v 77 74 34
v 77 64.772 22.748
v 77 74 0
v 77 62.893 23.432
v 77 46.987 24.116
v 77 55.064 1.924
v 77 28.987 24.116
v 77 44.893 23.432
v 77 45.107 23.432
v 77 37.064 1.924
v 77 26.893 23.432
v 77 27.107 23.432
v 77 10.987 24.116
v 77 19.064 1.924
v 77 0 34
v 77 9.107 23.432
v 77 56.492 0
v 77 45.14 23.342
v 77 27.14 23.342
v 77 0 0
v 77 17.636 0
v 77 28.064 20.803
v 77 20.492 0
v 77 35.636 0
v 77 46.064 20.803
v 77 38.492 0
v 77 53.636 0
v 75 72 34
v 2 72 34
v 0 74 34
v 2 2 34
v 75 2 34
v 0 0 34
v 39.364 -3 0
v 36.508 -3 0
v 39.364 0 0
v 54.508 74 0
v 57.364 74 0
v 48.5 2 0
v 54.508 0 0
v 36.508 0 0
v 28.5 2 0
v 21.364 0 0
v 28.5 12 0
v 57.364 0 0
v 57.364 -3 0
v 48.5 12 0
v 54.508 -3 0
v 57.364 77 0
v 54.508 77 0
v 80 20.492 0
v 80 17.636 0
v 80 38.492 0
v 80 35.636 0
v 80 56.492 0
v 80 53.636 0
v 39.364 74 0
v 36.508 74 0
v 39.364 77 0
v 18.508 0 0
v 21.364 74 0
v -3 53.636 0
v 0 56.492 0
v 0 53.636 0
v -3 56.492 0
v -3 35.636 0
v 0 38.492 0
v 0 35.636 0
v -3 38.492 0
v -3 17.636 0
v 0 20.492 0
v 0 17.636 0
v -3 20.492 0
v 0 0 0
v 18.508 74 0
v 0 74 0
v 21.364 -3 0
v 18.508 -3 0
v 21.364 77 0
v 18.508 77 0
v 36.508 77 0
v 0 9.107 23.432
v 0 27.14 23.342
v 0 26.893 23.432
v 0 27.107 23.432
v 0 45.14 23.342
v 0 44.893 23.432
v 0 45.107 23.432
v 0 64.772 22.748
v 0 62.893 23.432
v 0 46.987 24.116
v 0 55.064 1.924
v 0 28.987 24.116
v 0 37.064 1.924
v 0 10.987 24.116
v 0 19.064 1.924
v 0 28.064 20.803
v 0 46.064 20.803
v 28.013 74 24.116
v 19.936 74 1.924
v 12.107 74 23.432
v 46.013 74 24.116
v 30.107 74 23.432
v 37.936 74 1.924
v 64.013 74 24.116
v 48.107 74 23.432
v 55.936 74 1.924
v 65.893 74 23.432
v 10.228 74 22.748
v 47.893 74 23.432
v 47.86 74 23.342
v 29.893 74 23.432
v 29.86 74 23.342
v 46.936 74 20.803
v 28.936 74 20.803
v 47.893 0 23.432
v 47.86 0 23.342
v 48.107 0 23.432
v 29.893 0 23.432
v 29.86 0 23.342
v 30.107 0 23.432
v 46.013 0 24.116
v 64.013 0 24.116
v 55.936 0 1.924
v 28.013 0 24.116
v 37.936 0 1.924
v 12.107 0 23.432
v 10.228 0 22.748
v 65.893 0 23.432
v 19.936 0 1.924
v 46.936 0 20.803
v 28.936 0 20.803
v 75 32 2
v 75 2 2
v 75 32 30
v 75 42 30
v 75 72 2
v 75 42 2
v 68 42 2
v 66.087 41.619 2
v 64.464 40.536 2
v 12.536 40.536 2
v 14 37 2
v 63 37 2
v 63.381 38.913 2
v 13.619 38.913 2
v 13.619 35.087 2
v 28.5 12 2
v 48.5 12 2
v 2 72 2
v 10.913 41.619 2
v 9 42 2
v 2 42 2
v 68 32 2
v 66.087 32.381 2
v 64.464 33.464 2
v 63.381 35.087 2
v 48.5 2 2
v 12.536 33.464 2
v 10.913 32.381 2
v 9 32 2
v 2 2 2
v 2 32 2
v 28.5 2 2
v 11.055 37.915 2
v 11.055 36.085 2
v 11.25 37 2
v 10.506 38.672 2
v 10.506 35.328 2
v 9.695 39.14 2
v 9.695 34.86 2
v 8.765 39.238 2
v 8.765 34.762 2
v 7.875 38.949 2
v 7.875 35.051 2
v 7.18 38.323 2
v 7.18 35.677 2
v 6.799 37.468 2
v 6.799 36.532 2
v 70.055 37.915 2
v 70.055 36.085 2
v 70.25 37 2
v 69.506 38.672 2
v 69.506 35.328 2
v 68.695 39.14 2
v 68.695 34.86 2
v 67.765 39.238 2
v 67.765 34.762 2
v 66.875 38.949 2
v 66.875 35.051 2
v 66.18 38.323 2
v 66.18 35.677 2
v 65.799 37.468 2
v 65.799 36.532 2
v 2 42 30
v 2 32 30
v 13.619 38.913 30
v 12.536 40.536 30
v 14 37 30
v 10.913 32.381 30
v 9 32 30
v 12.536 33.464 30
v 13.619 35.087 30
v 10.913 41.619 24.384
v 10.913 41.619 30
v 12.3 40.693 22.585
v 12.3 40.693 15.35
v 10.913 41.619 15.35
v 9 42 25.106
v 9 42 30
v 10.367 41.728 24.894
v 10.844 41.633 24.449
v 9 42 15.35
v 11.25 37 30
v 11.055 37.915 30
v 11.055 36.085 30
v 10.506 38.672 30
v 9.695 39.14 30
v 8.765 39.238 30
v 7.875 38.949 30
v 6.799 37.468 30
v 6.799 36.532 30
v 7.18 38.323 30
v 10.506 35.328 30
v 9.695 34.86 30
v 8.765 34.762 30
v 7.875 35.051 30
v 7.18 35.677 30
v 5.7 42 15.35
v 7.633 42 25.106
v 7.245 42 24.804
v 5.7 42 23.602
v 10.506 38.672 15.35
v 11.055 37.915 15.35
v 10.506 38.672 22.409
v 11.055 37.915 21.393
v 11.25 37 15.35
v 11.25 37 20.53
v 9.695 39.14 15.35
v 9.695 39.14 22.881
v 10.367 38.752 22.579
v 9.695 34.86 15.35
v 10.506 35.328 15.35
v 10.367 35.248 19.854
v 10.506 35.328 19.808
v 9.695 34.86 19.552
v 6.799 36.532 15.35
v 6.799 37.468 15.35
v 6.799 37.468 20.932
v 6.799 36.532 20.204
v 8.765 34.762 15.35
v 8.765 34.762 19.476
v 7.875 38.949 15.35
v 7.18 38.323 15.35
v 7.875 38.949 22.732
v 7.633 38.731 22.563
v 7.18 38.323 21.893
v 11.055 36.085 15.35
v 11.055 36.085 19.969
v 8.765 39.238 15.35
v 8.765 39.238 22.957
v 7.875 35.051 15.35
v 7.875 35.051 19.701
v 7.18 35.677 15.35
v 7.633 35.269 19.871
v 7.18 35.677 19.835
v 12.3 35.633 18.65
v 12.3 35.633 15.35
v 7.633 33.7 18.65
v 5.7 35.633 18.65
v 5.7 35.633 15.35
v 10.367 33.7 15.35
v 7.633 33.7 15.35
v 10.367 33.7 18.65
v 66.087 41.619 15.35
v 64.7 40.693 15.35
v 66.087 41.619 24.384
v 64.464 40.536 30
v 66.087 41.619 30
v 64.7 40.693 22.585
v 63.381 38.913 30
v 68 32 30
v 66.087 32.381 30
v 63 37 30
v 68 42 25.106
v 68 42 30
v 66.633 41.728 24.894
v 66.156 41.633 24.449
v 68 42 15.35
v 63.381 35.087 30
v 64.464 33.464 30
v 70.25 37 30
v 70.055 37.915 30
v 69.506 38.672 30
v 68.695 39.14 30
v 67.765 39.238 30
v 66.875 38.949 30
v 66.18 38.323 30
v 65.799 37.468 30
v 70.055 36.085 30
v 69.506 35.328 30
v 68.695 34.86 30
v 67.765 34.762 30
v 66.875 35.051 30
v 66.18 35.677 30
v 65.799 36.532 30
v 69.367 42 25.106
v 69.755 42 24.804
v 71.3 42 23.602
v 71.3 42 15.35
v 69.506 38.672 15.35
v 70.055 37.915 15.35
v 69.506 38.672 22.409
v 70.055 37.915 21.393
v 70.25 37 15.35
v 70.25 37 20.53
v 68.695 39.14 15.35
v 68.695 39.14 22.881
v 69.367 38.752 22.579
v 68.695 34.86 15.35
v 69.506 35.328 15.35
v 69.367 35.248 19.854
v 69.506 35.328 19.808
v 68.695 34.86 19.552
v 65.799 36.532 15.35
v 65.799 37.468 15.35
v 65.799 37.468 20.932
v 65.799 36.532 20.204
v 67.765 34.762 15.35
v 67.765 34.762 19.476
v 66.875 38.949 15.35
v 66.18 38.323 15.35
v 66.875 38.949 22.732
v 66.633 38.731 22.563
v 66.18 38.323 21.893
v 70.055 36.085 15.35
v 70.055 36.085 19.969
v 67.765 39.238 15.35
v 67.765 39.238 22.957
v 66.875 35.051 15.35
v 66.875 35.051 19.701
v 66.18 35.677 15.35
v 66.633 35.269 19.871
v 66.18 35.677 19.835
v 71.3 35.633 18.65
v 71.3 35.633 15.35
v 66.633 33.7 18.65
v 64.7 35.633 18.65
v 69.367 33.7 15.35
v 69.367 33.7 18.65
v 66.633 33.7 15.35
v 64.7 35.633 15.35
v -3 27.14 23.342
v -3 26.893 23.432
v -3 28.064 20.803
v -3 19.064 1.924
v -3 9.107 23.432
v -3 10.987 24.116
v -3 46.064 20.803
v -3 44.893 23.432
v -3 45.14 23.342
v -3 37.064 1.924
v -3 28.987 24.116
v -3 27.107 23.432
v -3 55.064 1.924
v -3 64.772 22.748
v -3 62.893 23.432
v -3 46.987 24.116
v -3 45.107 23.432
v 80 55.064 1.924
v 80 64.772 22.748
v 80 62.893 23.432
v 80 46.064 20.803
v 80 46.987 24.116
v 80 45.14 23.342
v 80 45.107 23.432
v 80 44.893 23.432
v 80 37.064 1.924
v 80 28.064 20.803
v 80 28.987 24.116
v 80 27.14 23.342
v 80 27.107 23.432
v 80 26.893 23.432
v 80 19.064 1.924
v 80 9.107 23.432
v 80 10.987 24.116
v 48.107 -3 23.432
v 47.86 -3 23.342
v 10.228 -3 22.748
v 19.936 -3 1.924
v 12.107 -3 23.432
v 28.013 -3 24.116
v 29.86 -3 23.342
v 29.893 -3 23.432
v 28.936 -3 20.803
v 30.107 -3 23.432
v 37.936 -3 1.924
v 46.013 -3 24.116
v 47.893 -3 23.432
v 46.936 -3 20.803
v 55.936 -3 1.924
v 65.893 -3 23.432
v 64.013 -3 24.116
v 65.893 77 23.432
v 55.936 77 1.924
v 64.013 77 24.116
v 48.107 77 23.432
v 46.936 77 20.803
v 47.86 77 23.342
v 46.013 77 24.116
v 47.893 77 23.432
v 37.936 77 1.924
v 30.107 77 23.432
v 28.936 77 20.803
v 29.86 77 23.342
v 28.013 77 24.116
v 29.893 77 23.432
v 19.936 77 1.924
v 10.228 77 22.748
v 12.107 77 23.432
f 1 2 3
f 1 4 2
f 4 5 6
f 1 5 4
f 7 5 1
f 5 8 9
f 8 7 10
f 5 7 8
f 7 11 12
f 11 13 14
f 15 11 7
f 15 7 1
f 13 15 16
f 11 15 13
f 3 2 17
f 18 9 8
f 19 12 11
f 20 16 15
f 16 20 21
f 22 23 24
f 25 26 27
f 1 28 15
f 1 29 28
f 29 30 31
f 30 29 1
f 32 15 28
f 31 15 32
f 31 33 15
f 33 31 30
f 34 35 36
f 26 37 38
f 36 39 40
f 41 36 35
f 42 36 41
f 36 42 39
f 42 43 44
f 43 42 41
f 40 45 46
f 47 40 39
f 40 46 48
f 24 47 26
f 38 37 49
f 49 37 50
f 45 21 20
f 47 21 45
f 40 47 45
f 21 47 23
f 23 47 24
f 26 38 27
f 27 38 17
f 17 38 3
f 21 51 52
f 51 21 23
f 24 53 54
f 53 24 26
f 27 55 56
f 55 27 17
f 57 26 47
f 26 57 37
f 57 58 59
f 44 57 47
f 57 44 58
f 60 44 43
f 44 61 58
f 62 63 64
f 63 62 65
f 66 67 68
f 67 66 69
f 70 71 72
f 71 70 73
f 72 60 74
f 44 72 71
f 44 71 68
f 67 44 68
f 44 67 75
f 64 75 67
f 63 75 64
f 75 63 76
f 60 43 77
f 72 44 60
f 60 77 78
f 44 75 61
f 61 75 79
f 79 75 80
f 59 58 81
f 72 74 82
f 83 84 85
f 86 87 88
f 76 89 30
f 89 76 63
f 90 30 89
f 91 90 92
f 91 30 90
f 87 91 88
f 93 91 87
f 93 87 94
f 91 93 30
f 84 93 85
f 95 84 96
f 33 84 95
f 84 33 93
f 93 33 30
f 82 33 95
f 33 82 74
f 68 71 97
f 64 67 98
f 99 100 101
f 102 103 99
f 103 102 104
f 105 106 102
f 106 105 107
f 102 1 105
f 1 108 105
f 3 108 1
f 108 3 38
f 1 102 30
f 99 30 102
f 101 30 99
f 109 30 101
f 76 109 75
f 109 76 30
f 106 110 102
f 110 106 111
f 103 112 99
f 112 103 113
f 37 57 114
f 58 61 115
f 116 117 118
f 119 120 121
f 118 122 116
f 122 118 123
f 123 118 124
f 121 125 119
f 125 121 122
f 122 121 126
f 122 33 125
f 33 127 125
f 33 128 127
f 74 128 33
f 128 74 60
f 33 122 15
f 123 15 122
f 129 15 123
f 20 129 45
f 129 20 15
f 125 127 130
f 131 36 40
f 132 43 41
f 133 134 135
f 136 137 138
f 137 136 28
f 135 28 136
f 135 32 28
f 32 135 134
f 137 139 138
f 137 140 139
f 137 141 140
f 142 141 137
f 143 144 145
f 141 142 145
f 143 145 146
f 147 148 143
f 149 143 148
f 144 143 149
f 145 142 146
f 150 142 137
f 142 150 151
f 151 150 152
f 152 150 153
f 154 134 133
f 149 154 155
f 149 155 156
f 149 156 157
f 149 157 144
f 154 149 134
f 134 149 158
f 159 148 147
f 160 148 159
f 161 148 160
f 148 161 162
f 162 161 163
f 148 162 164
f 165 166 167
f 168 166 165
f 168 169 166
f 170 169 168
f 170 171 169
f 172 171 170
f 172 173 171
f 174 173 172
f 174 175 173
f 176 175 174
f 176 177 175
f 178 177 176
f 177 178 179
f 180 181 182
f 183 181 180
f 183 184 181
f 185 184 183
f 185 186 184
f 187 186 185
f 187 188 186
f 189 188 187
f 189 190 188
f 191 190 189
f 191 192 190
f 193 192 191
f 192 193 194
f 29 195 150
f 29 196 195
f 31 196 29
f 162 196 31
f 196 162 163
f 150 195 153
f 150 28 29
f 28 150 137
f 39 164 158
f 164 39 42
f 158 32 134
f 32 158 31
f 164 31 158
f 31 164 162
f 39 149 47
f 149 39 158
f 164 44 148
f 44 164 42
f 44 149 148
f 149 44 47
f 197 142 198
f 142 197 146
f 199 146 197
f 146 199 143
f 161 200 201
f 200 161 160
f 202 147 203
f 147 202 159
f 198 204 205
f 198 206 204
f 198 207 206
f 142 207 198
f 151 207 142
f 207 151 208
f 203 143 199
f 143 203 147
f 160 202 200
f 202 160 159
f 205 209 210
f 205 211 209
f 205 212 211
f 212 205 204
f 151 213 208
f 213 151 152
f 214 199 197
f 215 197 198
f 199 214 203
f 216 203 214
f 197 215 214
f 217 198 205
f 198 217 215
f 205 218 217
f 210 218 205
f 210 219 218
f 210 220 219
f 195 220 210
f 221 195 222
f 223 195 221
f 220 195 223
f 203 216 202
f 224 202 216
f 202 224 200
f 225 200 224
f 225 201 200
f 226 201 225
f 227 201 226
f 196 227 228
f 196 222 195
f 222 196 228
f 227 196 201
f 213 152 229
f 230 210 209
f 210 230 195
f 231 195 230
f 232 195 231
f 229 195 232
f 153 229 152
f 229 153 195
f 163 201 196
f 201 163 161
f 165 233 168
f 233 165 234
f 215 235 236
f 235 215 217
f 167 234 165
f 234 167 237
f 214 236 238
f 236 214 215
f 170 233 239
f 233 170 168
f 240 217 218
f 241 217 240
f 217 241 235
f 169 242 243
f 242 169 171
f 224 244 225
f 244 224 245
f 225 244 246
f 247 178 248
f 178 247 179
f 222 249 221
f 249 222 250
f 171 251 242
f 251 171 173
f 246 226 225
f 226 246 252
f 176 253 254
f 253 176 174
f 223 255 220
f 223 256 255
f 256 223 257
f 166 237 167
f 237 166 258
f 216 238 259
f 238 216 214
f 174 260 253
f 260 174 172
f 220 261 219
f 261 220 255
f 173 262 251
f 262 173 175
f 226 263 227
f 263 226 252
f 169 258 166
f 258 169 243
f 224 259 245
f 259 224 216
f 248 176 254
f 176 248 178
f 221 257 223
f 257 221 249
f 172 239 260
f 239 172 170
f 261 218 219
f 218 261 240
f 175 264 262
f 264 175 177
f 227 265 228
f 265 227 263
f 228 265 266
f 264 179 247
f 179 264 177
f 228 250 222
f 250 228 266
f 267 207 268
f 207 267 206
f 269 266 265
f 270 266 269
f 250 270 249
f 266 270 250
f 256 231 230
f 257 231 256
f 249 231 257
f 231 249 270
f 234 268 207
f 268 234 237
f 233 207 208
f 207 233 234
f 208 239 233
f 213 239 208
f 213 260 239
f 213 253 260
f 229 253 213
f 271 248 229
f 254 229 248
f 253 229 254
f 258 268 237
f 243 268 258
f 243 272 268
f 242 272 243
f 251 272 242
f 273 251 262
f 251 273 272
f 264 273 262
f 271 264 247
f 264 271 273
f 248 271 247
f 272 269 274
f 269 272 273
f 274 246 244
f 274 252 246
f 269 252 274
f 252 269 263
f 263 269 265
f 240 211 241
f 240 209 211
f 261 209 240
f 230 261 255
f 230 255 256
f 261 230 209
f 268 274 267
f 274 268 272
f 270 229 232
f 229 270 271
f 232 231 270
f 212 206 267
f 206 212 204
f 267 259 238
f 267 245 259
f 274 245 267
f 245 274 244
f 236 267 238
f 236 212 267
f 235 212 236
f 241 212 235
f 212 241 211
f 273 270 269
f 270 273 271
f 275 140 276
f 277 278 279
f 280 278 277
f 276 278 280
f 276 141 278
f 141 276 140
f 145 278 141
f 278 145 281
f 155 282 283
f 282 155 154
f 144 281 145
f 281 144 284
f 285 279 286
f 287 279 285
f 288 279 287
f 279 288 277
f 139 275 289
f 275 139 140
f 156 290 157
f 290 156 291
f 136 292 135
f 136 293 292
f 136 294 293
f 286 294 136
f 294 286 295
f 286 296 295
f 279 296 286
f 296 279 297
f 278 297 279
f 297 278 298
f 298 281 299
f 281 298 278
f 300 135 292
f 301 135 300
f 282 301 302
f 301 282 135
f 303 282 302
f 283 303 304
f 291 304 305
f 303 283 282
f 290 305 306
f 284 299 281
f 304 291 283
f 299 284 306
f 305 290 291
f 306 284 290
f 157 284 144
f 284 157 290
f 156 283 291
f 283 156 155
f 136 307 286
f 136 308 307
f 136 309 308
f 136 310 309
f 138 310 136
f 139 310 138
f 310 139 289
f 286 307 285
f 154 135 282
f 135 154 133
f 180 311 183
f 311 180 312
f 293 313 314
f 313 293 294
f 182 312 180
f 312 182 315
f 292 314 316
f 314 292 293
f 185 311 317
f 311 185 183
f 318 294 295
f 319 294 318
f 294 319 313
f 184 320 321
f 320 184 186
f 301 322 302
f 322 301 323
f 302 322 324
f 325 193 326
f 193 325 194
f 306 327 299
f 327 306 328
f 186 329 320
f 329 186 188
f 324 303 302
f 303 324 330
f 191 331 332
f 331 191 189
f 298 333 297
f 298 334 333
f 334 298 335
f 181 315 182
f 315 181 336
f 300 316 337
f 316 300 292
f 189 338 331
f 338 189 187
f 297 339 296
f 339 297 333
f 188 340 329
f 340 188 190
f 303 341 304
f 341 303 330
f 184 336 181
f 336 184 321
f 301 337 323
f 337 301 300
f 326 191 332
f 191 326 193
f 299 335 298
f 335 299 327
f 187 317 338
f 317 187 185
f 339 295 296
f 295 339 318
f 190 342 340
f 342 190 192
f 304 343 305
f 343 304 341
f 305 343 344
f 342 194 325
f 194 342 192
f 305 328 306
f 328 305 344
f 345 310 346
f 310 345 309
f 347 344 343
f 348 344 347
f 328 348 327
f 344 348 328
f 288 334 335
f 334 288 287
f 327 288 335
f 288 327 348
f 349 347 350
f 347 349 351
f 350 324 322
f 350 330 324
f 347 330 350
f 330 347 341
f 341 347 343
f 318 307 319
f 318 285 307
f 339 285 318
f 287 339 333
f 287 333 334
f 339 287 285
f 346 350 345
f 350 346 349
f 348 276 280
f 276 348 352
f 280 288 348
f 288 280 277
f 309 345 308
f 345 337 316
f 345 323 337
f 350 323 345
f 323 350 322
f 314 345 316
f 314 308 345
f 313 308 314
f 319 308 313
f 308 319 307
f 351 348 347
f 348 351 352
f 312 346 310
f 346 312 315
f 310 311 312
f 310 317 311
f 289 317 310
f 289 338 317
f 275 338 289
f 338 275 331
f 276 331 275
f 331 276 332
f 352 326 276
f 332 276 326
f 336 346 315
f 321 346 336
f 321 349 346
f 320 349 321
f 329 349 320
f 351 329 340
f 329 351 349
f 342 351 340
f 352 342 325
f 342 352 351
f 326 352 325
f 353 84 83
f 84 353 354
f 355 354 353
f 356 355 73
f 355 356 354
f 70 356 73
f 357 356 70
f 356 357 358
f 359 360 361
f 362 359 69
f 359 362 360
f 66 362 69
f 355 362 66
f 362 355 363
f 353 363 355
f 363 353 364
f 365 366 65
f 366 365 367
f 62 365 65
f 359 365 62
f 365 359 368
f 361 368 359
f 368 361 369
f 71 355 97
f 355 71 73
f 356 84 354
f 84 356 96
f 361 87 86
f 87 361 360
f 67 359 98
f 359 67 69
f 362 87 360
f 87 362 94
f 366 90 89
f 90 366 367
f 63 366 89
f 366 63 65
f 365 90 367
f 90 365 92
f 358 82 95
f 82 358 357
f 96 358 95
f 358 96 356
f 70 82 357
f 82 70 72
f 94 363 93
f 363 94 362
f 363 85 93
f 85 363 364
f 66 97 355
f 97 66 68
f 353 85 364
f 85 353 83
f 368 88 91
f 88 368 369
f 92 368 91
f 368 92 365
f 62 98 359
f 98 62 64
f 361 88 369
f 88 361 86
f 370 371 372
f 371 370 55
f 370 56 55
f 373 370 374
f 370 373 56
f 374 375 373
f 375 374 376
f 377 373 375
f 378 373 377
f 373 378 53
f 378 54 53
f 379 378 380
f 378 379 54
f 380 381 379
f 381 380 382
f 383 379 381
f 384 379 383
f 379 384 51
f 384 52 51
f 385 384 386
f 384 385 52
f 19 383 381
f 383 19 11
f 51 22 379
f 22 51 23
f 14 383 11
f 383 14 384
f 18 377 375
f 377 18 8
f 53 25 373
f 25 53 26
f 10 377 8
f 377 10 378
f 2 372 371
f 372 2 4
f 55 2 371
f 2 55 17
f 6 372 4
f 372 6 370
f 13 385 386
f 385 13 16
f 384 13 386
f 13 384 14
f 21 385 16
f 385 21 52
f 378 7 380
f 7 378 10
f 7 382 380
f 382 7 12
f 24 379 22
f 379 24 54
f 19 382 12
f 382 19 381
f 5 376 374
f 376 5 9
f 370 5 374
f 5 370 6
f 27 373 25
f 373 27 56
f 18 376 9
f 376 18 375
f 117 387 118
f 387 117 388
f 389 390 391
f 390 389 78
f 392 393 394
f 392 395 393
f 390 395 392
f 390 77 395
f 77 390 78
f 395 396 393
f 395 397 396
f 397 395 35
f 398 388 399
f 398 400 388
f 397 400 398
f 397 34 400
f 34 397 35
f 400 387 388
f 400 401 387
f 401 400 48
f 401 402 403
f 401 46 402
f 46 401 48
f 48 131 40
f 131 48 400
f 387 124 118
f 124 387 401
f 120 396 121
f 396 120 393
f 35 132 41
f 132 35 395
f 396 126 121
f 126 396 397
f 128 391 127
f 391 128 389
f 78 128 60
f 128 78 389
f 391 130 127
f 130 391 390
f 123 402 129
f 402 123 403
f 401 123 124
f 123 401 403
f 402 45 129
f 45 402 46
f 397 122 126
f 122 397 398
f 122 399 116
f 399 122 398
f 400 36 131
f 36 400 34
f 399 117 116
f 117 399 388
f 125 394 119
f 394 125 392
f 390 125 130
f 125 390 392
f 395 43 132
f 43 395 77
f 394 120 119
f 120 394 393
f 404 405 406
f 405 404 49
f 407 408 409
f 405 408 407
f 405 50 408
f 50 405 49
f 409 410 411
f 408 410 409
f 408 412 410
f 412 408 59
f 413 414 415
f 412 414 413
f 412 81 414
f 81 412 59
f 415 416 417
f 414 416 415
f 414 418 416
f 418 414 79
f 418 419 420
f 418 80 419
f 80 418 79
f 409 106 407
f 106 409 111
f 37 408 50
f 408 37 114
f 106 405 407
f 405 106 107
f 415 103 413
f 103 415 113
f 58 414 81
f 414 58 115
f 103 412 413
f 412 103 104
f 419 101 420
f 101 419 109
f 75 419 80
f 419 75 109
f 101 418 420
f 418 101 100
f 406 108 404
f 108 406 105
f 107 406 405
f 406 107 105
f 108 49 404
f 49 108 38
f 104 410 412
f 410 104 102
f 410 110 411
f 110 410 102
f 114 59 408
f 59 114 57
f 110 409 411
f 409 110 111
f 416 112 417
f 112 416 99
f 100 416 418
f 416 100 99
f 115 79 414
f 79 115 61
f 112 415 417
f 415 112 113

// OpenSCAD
// file: screw.scad
module screw()
{
  size = 6;
  height=3;
  translate([0, 0, height/2])
    intersection()
    {
      cube([size, size, height], center=true);
      rotate([0,0,45])
        cube([size, size, height], center=true);
    }
}

%screw();
// file: controller.scad
module controller()
{
  difference()
  {
    // body
    union()
    {
      difference()
      {
        union()
        {
          translate([0,0,24])
            cube([88, 86, 13]);
          translate([15, 10, 0])
            cube([59, 66, 24]);
        }
        translate([15+2, 10, 0])
          cube([55, 16, 25]);
      }
      // power cord mounts
      translate([(88-20)/2, 10+2, 24-10])
        cube([20, 8, 10]);
      // screw hole frame
      for(dx = [15, 88-15])
        translate([dx, 43, 24-3])
          hull()
          {
            for(dy = [0, 13-10.5])
              translate([0, dy, 0])
                cylinder(r=10.5/2, h=3);
          }
    }

    // screw mounts
    for(dx = [15, 88-15])
      translate([dx, 43, 0])
        hull()
        {
          for(dy = [0, 13-10.5])
            translate([0, dy, 0])
              cylinder(r=10.5/2, h=24-3);
        }

    // screw holes
    for(dx = [15, 88-15+3/2/2])
      translate([dx, 43, 24-3])
        hull()
        {
          for(dy = [0, 13-10.5])
            translate([0, dy, 0])
              cylinder(r=3/2, h=3, $fs=0.01);
        }
  }
}

%controller();
// main file
use <controller.scad>
use <screw.scad>

module side_bruse_impl()
{
  for(sig = [-1, +1])
    for(i = [1, 2, 3])
      translate([0, i*18, -1])
        rotate([sig*20, 0, 0])
          cube([3, 2, 26]);
}

module junction_box_impl()
{
  wall = 2;
  extra_depth = 5;
  int_size = [73, 70, 24+3+extra_depth];

  difference()
  {
    // main box
    cube(int_size + [2,2,1]*wall);
    translate([1,1,1]*wall)
      cube(int_size);
    // place for cables
    cable_cut_in = [20, 10, wall];
    translate([(int_size[0]+2*wall-cable_cut_in[0])/2, wall, 0])
      cube(cable_cut_in);
  }

  // screw holes
  dist_from_center = 59/2;
  for(dx = [-1, +1])
  {
    translate([(int_size[0]+2*wall)/2+dx*dist_from_center,
               wall+int_size[1]/2,
               wall])
    {
      difference()
      {
        // main screw corridor
        union()
        {
          cylinder(r=10/2, h=int_size[2]-4);
          translate([((12/2+1)/2)*(dx-1), -10/2, 0])
            cube([12/2+1, 10, int_size[2]-4]);
        }
        cylinder(r=(3+1.5)/2, h=int_size[2]-2, $fs=1);
        // nut cut-in
        translate([0, 0, int_size[2]-4-13])
          scale(1.1)
            hull()
            {
              screw();
              translate([0, 9, 0])
                screw();
              translate([0, 9, 7])
                screw();
            }
      }
    }
  }

  // side bruses for better mounting - left/right
  for(dx = [-3, int_size[0]+2*wall])
    translate([dx, 0, 0])
      side_bruse_impl();
  // side bruses for better mounting - up/down
  for(dy = [-3, int_size[1]+2*wall])
    translate([75, dy, 0])
      rotate([0, 0, 90])
        side_bruse_impl();
}

module junction_box()
{
  difference()
  {
    junction_box_impl();
    translate([-10, -10, -5])
      cube([100,100,5]);
  }
}

if(false)
  translate([-7, -6, 10*2])
    controller();

junction_box();
